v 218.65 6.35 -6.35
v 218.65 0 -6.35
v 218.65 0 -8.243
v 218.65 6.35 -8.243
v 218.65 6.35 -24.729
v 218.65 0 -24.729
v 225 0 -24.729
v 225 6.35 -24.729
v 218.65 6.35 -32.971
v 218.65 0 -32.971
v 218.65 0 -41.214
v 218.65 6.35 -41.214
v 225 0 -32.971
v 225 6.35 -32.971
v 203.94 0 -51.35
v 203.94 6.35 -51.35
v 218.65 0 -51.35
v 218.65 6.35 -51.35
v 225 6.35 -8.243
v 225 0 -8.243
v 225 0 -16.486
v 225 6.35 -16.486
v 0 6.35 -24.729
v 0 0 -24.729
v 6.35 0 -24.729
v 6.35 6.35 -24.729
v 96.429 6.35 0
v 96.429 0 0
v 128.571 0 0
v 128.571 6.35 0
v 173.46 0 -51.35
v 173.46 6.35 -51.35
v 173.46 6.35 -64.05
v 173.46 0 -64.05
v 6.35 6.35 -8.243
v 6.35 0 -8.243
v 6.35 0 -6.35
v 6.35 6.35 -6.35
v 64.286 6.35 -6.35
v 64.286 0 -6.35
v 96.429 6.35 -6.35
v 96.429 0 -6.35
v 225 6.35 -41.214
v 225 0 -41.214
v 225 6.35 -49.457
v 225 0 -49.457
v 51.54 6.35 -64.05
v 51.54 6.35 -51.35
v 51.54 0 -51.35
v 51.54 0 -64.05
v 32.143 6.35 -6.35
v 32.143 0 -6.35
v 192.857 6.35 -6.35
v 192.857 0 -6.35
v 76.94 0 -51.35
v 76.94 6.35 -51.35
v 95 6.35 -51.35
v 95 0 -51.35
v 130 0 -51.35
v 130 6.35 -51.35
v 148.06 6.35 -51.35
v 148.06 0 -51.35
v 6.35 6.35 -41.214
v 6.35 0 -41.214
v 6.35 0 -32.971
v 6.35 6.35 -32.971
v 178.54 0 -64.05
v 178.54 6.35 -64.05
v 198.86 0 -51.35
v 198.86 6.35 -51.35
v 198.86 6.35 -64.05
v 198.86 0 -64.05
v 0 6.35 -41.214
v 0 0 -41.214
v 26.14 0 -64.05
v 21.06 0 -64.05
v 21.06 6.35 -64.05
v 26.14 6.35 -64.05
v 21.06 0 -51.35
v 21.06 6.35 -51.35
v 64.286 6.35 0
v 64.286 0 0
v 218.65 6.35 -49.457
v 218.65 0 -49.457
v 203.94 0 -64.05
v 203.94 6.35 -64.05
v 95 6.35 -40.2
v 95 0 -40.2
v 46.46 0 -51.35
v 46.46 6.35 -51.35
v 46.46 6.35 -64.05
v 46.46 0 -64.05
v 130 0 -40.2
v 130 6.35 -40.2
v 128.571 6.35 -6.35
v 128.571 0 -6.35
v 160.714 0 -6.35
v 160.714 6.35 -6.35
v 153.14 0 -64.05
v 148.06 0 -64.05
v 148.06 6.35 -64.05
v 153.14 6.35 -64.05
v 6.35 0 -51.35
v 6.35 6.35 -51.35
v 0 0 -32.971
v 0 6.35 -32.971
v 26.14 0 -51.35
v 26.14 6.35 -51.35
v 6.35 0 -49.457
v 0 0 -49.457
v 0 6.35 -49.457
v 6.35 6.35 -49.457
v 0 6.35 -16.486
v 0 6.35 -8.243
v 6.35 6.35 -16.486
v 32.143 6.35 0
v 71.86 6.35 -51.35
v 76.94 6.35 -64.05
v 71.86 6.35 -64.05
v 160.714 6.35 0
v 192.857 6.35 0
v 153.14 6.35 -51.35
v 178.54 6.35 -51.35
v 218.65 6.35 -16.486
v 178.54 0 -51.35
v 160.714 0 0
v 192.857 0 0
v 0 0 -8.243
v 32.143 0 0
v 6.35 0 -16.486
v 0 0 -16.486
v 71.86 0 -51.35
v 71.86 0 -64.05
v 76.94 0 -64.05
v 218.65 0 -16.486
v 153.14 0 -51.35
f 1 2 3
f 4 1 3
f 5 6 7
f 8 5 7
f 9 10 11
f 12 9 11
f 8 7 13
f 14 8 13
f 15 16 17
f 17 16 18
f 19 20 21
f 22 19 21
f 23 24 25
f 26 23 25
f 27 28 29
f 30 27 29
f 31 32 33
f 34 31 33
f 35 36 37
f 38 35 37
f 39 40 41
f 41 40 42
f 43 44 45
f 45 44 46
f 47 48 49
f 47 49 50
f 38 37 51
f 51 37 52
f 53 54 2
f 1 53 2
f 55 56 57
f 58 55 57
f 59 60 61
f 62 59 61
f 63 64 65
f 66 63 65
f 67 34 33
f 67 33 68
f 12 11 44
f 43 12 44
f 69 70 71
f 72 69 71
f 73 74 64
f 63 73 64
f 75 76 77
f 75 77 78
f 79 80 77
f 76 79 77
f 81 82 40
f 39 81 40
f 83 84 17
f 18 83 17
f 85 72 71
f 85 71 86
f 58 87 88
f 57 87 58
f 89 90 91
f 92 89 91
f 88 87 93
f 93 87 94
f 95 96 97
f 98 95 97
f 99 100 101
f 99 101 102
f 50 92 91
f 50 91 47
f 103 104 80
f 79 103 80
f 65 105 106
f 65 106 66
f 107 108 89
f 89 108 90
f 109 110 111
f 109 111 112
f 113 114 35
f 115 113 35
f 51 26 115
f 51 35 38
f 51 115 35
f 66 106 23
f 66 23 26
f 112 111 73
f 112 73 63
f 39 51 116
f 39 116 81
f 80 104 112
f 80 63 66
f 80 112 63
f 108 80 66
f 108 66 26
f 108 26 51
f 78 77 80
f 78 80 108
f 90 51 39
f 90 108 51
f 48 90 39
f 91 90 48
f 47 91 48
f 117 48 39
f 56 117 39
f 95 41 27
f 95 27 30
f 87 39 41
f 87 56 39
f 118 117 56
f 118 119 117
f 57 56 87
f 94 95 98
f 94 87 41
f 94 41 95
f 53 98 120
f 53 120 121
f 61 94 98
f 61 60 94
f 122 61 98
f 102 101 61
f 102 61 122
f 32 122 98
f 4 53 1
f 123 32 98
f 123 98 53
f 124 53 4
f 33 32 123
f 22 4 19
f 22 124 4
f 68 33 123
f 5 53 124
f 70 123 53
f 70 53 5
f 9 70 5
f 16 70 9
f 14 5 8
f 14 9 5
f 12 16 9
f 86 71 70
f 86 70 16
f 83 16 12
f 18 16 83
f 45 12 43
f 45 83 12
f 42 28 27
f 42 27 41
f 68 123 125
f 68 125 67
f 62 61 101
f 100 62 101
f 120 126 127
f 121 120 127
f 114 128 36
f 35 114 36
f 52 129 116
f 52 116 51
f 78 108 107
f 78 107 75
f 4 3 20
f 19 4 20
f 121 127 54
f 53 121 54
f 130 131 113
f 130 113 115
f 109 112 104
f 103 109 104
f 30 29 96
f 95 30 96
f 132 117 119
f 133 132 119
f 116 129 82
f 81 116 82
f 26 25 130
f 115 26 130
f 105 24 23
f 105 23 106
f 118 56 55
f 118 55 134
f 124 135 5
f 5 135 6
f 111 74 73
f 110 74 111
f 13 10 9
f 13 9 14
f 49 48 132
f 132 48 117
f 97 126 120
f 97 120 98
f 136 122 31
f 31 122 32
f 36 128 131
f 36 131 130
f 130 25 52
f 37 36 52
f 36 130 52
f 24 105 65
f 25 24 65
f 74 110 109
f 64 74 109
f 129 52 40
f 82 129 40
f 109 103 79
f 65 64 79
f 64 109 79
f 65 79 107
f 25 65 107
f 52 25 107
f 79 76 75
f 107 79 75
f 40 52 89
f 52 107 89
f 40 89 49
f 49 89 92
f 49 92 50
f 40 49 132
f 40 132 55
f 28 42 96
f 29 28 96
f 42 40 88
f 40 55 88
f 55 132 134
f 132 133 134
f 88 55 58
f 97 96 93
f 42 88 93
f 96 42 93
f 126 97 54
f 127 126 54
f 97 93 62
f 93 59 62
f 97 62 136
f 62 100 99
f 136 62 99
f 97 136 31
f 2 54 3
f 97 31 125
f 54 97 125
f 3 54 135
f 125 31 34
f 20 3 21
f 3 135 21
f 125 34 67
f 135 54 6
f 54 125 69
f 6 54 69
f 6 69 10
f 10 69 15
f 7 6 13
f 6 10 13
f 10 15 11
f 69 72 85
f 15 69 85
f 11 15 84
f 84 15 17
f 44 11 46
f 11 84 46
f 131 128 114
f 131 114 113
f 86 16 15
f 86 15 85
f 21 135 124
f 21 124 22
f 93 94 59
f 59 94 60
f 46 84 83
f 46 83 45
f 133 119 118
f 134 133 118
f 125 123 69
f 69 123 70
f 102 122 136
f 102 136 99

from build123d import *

# Parameters (mm, degrees)
SKETCH1_W           = 32.142857142
SKETCH1_H           = 6.35
SKETCH1_W_2         = 32.142857143
SKETCH1_W_3         = 6.35
SKETCH1_H_2         = 8.242857143
SKETCH1_H_3         = 8.242857142
BOSS_EXTRUDE1_DEPTH = 6.35
SKETCH2_W           = 212.3
SKETCH2_H           = 6.35
SKETCH2_W_2         = 5.08
BOSS_EXTRUDE2_DEPTH = 6.35
SKETCH3_W           = 35
SKETCH3_H           = 23.85
CUT_EXTRUDE1_DEPTH  = 235.025052078
SKETCH4_W           = 14.71
SKETCH4_H           = 6.35
SKETCH4_W_2         = 20.32
CUT_EXTRUDE2_DEPTH  = 6.35
SKETCH5_W           = 20.32
SKETCH5_H           = 6.35
SKETCH5_W_2         = 18.06
CUT_EXTRUDE3_DEPTH  = 235.025052078


with BuildPart() as part:
    # Sketch1 → Boss-Extrude1 (new body)
    with BuildSketch(Plane(origin=(0, 0, 0), x_dir=(1, 0, 0), z_dir=(0, 1, 0))):
        Polygon((6.35, 6.35), (32.142857143, 6.35), (64.285714286, 6.35), (96.428571429, 6.35), (128.571428571, 6.35), (160.714285714, 6.35), (192.857142857, 6.35), (218.65, 6.35), (218.65, 8.242857143), (218.65, 16.485714286), (218.65, 24.728571429), (218.65, 32.971428571), (218.65, 41.214285714), (218.65, 49.457142857), (218.65, 51.35), (192.857142857, 51.35), (160.714285714, 51.35), (128.571428571, 51.35), (96.428571429, 51.35), (64.285714286, 51.35), (32.142857143, 51.35), (6.35, 51.35), (6.35, 49.457142857), (6.35, 41.214285714), (6.35, 32.971428571), (6.35, 24.728571429), (6.35, 16.485714286), (6.35, 8.242857143), align=None)
        with Locations((112.5, 54.525)):
            Rectangle(SKETCH1_W, SKETCH1_H)
        with Locations((112.5, 3.175)):
            Rectangle(SKETCH1_W, SKETCH1_H)
        with Locations((176.785714286, 3.175)):
            Rectangle(SKETCH1_W_2, SKETCH1_H)
        with Locations((176.785714286, 54.525)):
            Rectangle(SKETCH1_W_2, SKETCH1_H)
        with Locations((48.214285715, 54.525)):
            Rectangle(SKETCH1_W_2, SKETCH1_H)
        with Locations((48.214285715, 3.175)):
            Rectangle(SKETCH1_W_2, SKETCH1_H)
        with Locations((3.175, 12.364285714)):
            Rectangle(SKETCH1_W_3, SKETCH1_H_2)
        with Locations((3.175, 28.85)):
            Rectangle(SKETCH1_W_3, SKETCH1_H_3)
        with Locations((3.175, 45.335714286)):
            Rectangle(SKETCH1_W_3, SKETCH1_H_2)
        with Locations((221.825, 12.364285714)):
            Rectangle(SKETCH1_W_3, SKETCH1_H_2)
        with Locations((221.825, 28.85)):
            Rectangle(SKETCH1_W_3, SKETCH1_H_3)
        with Locations((221.825, 45.335714286)):
            Rectangle(SKETCH1_W_3, SKETCH1_H_2)
    extrude(amount=BOSS_EXTRUDE1_DEPTH)

    # Sketch2 → Boss-Extrude2 (add)
    with BuildSketch(Plane(origin=(0, 6.35, 0), x_dir=(1, 0, 0), z_dir=(0, 1, 0))):
        with Locations((112.5, 54.525)):
            Rectangle(SKETCH2_W, SKETCH2_H)
        with Locations((23.6, 60.875)):
            Rectangle(SKETCH2_W_2, SKETCH2_H)
        with Locations((49, 60.875)):
            Rectangle(SKETCH2_W_2, SKETCH2_H)
        with Locations((74.4, 60.875)):
            Rectangle(SKETCH2_W_2, SKETCH2_H)
        with Locations((99.8, 60.875)):
            Rectangle(SKETCH2_W_2, SKETCH2_H)
        with Locations((201.4, 60.875)):
            Rectangle(SKETCH2_W_2, SKETCH2_H)
        with Locations((176, 60.875)):
            Rectangle(SKETCH2_W_2, SKETCH2_H)
        with Locations((125.2, 60.875)):
            Rectangle(SKETCH2_W_2, SKETCH2_H)
        with Locations((150.6, 60.875)):
            Rectangle(SKETCH2_W_2, SKETCH2_H)
    extrude(amount=-BOSS_EXTRUDE2_DEPTH)

    # Sketch3 → Cut-Extrude1 (cut, through all)
    with BuildSketch(Plane(origin=(0, 6.35, 0), x_dir=(1, 0, 0), z_dir=(0, 1, 0))):
        with Locations((112.5, 52.125)):
            Rectangle(SKETCH3_W, SKETCH3_H)
    extrude(amount=-CUT_EXTRUDE1_DEPTH, mode=Mode.SUBTRACT)

    # Sketch4 → Cut-Extrude2 (cut)
    with BuildSketch(Plane(origin=(0, 6.35, 0), x_dir=(1, 0, 0), z_dir=(0, 1, 0))):
        with Locations((13.705, 54.525)):
            Rectangle(SKETCH4_W, SKETCH4_H)
        with Locations((36.3, 54.525)):
            Rectangle(SKETCH4_W_2, SKETCH4_H)
        with Locations((211.295, 54.525)):
            Rectangle(SKETCH4_W, SKETCH4_H)
        with Locations((188.7, 54.525)):
            Rectangle(SKETCH4_W_2, SKETCH4_H)
    extrude(amount=-CUT_EXTRUDE2_DEPTH, mode=Mode.SUBTRACT)

    # Sketch5 → Cut-Extrude3 (cut, through all)
    with BuildSketch(Plane(origin=(0, 6.35, 0), x_dir=(1, 0, 0), z_dir=(0, 1, 0))):
        with Locations((61.7, 54.525)):
            Rectangle(SKETCH5_W, SKETCH5_H)
        with Locations((85.97, 54.525)):
            Rectangle(SKETCH5_W_2, SKETCH5_H)
        with Locations((139.03, 54.525)):
            Rectangle(SKETCH5_W_2, SKETCH5_H)
        with Locations((163.3, 54.525)):
            Rectangle(SKETCH5_W, SKETCH5_H)
    extrude(amount=-CUT_EXTRUDE3_DEPTH, mode=Mode.SUBTRACT)


solid = part.part
